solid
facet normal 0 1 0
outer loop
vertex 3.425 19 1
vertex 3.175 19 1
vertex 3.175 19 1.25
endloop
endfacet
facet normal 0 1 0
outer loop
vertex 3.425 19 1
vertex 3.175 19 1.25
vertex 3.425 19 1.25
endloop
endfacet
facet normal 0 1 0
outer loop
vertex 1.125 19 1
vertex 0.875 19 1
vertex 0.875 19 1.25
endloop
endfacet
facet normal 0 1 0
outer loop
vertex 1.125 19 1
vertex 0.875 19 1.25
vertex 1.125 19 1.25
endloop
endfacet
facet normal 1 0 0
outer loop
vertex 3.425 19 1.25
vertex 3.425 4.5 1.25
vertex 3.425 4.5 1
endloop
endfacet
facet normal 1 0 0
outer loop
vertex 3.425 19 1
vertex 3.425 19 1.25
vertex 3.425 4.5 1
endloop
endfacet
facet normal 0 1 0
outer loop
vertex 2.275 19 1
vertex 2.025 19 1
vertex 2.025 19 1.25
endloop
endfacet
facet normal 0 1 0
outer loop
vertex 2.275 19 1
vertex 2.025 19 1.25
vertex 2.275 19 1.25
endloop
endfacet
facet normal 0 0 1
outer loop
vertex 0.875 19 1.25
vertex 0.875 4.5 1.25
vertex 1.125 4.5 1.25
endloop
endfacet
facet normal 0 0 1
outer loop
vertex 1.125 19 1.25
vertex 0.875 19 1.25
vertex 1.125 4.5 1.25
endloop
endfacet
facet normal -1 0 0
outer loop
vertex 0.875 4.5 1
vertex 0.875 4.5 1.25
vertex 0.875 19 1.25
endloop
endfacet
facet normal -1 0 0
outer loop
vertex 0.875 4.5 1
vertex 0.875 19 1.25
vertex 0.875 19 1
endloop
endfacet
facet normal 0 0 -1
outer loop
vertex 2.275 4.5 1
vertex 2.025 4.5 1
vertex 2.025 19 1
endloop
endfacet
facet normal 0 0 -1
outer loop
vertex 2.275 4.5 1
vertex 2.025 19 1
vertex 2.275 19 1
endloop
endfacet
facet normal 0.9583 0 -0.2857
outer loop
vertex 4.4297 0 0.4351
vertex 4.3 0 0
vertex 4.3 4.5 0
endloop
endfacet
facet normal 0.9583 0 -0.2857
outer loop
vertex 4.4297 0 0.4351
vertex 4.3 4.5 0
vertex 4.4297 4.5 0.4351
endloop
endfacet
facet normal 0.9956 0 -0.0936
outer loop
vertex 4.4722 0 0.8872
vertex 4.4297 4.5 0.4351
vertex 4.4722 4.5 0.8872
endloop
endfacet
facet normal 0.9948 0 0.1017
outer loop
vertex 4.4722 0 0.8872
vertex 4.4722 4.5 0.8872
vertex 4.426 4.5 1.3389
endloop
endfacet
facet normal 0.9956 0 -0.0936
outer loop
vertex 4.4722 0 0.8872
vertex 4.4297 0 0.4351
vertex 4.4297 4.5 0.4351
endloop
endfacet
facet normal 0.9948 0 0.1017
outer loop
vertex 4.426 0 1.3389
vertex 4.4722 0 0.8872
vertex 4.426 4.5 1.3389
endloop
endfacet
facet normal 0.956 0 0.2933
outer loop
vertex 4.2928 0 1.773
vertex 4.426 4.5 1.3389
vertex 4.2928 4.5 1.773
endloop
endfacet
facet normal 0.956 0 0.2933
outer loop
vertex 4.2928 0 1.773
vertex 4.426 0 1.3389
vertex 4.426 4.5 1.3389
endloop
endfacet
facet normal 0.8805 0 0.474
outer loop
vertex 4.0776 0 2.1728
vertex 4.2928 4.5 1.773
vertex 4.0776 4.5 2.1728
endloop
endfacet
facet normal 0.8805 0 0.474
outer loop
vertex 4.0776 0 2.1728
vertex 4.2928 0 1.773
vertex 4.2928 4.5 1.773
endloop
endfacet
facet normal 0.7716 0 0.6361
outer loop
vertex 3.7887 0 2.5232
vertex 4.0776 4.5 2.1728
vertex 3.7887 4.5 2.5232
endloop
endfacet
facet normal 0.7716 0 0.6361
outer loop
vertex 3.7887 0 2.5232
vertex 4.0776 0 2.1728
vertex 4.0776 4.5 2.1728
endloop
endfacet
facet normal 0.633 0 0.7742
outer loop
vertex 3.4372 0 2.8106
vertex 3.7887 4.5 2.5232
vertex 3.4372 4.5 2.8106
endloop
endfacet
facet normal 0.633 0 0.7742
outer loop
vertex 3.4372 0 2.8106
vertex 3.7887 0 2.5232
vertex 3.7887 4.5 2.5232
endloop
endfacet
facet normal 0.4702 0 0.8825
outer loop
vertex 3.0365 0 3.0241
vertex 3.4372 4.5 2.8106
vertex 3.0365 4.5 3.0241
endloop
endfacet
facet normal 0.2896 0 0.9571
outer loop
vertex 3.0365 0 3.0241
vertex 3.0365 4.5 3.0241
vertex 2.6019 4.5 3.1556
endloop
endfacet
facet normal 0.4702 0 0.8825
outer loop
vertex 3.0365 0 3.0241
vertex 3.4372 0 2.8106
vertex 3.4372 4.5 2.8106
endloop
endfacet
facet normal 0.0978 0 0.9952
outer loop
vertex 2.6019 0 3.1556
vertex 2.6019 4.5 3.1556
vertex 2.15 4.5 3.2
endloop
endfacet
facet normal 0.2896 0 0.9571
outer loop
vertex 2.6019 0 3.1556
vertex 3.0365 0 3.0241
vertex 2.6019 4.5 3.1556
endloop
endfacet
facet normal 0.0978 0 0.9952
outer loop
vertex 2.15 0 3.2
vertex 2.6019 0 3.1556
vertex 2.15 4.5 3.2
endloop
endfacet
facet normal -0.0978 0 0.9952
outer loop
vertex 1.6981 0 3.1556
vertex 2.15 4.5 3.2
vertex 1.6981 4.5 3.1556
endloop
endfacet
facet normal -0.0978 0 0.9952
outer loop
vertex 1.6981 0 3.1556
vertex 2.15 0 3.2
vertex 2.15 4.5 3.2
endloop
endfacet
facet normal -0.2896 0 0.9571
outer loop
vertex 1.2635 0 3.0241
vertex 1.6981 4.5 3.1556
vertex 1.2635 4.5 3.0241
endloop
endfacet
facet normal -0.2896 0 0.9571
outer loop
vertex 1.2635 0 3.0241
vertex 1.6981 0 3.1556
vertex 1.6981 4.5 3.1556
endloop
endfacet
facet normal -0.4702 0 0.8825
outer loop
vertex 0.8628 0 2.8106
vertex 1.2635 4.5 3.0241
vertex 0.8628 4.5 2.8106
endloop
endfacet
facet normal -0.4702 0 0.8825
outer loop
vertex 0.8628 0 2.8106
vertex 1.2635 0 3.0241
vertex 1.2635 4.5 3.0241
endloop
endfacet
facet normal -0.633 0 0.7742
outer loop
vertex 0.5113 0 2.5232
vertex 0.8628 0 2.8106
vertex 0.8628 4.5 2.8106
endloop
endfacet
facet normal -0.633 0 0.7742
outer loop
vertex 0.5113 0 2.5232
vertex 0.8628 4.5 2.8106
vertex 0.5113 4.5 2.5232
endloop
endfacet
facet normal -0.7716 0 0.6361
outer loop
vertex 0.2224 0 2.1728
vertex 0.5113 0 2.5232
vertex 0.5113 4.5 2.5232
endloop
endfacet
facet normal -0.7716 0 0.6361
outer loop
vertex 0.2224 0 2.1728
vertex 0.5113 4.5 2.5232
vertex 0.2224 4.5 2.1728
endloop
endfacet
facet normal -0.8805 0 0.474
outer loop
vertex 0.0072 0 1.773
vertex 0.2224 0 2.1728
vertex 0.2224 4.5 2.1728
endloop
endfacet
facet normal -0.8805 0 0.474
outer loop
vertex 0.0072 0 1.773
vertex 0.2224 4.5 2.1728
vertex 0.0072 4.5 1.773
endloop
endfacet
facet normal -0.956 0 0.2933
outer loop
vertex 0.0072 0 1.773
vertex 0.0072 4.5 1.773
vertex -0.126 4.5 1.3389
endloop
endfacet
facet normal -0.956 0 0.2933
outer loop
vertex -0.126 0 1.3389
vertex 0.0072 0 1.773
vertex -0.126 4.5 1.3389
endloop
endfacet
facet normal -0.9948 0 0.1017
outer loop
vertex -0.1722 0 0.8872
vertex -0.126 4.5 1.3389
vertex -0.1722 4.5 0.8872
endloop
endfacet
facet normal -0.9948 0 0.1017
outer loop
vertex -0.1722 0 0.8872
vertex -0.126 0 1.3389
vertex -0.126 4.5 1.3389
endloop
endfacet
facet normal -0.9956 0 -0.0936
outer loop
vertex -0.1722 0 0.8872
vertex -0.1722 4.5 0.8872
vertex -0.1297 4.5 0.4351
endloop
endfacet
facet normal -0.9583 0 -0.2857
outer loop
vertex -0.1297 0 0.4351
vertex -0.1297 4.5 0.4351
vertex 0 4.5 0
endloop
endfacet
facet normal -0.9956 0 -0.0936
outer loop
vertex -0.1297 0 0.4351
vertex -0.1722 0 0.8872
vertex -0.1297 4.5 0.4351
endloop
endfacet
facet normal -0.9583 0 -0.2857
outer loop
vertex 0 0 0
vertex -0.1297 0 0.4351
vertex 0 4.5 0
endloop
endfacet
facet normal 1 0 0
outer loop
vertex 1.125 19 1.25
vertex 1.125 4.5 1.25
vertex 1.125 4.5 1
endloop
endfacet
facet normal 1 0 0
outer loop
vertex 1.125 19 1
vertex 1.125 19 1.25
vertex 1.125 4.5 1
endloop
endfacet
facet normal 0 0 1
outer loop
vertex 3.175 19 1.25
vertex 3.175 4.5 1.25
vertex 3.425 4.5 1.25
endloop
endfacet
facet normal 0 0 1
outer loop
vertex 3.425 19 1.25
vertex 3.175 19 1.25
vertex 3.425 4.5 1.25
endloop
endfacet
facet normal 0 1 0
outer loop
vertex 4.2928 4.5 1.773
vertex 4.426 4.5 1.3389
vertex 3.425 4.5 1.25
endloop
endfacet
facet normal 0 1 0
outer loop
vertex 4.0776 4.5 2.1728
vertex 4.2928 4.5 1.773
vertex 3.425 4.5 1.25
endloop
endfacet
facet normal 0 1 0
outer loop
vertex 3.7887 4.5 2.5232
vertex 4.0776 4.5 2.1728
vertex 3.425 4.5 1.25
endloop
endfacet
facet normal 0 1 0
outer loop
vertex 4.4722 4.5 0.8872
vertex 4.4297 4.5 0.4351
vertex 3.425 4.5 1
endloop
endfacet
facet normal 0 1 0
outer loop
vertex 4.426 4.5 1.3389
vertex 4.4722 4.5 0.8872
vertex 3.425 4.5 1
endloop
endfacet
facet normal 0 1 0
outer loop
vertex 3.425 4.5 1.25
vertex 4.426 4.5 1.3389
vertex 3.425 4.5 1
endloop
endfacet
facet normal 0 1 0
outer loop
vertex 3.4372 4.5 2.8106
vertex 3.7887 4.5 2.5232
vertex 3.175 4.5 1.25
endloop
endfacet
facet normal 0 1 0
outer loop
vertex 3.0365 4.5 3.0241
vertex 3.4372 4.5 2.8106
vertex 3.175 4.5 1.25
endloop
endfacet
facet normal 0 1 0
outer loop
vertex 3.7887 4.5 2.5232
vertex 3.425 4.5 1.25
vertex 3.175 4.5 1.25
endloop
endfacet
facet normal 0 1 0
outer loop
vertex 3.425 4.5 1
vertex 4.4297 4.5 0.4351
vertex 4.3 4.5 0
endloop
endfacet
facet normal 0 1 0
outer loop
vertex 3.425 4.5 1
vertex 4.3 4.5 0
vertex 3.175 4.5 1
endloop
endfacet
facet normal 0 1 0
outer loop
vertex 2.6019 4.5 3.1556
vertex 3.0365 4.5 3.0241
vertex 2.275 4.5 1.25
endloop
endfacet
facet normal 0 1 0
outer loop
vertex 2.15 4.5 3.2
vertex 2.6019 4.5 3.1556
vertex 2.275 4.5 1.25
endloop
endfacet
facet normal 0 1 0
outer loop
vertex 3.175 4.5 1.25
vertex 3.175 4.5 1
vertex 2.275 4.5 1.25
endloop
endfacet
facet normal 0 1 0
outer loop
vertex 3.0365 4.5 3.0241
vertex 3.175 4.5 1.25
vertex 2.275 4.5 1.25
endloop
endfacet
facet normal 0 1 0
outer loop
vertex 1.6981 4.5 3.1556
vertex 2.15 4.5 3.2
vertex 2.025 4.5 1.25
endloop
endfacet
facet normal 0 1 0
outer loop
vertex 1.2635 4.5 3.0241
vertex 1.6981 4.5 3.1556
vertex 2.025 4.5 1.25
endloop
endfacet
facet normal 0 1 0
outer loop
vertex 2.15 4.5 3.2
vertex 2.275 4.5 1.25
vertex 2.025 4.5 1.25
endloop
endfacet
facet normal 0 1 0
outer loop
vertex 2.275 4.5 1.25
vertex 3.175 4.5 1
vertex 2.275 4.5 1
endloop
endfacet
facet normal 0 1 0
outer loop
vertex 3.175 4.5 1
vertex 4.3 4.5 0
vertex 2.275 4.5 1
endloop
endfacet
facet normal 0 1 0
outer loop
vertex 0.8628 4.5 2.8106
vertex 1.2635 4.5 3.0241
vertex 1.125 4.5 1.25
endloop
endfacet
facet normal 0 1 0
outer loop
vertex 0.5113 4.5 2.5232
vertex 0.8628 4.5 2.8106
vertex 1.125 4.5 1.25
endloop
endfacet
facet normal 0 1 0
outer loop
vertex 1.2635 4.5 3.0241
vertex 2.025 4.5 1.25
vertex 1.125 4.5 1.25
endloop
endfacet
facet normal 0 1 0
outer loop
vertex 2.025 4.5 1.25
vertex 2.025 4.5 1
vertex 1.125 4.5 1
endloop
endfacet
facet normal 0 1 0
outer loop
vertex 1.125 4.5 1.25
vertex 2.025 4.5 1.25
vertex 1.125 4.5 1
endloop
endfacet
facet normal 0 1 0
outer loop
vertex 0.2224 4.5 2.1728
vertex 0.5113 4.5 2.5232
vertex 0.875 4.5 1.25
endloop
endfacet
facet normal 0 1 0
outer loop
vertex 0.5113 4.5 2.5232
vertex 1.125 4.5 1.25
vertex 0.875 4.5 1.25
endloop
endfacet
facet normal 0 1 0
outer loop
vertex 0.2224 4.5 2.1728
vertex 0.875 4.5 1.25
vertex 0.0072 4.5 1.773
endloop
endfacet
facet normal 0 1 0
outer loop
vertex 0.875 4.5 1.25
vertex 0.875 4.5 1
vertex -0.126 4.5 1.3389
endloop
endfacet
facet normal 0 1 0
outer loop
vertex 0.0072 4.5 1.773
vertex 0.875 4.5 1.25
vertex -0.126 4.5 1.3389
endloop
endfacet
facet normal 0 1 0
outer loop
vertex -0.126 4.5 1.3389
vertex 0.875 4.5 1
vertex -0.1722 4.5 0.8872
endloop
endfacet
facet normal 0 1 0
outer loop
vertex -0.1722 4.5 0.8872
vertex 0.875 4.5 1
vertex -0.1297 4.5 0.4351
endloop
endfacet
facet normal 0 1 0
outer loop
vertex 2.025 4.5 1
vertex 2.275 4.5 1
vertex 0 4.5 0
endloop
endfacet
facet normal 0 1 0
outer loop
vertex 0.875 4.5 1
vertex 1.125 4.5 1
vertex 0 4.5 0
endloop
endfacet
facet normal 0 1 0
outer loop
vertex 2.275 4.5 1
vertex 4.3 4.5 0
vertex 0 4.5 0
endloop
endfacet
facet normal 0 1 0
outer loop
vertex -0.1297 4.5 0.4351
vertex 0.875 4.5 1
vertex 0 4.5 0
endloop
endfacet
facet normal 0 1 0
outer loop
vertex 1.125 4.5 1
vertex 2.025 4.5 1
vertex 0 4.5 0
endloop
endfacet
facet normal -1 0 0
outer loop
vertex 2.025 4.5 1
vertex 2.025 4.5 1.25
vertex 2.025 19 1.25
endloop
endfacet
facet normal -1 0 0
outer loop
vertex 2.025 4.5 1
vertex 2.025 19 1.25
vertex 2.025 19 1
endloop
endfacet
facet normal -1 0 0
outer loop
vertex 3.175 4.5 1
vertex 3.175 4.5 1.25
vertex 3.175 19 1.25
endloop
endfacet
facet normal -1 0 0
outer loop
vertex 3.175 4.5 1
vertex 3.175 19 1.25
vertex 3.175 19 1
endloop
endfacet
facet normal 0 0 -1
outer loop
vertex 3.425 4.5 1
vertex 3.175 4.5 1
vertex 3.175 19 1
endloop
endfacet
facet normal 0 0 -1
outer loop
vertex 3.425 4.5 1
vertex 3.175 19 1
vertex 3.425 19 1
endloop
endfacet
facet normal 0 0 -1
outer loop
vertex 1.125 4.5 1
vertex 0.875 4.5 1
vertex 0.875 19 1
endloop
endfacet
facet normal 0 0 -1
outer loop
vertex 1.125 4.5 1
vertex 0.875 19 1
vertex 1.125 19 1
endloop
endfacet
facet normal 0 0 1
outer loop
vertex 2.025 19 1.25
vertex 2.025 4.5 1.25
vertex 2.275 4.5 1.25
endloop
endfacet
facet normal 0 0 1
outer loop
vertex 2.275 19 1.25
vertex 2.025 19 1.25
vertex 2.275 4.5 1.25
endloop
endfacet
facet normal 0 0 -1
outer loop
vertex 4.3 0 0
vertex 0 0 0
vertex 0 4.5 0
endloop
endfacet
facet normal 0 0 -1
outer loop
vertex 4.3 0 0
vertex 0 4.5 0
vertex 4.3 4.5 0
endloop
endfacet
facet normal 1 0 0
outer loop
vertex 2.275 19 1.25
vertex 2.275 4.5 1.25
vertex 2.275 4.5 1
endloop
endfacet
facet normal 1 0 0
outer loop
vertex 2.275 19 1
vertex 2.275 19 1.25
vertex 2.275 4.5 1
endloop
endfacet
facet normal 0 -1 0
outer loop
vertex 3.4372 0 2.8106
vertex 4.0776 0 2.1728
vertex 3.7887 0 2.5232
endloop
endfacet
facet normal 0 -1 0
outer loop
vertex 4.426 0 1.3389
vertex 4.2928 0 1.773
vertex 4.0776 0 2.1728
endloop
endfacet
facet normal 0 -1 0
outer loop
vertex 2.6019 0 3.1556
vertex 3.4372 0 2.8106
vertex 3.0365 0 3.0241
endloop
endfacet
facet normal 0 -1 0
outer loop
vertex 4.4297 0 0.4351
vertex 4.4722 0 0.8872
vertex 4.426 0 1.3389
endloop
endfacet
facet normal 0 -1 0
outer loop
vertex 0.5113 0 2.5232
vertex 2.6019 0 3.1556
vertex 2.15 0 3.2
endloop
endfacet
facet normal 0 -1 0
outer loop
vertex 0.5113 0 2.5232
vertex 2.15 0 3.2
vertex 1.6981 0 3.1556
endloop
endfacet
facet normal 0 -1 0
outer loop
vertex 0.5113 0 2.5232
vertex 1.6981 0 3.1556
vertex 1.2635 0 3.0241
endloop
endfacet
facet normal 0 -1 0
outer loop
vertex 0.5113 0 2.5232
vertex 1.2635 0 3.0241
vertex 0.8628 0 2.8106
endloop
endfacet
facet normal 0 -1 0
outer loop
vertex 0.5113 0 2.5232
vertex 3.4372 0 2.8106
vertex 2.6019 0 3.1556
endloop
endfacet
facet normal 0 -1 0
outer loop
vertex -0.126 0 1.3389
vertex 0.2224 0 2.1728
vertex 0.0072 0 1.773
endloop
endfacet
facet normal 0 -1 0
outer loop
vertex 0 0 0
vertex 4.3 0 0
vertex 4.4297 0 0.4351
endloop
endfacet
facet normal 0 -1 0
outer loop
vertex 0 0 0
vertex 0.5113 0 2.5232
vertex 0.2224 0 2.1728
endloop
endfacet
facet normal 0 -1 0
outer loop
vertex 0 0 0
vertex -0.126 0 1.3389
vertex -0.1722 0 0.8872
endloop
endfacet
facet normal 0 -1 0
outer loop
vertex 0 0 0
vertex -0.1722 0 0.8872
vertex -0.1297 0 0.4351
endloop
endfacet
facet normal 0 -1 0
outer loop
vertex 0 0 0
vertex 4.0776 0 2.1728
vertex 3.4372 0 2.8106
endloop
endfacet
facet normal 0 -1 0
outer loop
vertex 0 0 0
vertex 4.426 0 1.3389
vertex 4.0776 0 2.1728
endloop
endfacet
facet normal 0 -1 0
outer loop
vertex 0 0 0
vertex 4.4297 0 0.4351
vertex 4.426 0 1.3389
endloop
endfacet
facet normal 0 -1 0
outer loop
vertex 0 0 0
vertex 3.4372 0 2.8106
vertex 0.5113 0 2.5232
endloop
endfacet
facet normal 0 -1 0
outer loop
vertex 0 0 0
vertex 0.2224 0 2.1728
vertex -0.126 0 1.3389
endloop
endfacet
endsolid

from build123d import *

# Parameters (mm, degrees)
BOSS_EXTRUDE1_DEPTH = 4.5
SKETCH2_W           = 0.25
SKETCH2_H           = 0.25
BOSS_EXTRUDE2_DEPTH = 14.5


with BuildPart() as part:
    # Sketch1 → Boss-Extrude1 (new body)
    with BuildSketch(Plane(origin=(0, 0, 0), x_dir=(1, 0, 0), z_dir=(0, 1, 0))):
        with BuildLine():
            Line((0, 0), (4.3, 0))
            ThreePointArc((4.3, 0), (2.15, -3.2), (0, 0))
        make_face()
    extrude(amount=BOSS_EXTRUDE1_DEPTH)

    # Sketch2 → Boss-Extrude2 (add)
    with BuildSketch(Plane(origin=(0, 4.5, 0), x_dir=(1, 0, 0), z_dir=(0, 1, 0))):
        with Locations((3.3, -1.125)):
            Rectangle(SKETCH2_W, SKETCH2_H)
        with Locations((2.15, -1.125)):
            Rectangle(SKETCH2_W, SKETCH2_H)
        with Locations((1, -1.125)):
            Rectangle(SKETCH2_W, SKETCH2_H)
    extrude(amount=BOSS_EXTRUDE2_DEPTH)


solid = part.part
